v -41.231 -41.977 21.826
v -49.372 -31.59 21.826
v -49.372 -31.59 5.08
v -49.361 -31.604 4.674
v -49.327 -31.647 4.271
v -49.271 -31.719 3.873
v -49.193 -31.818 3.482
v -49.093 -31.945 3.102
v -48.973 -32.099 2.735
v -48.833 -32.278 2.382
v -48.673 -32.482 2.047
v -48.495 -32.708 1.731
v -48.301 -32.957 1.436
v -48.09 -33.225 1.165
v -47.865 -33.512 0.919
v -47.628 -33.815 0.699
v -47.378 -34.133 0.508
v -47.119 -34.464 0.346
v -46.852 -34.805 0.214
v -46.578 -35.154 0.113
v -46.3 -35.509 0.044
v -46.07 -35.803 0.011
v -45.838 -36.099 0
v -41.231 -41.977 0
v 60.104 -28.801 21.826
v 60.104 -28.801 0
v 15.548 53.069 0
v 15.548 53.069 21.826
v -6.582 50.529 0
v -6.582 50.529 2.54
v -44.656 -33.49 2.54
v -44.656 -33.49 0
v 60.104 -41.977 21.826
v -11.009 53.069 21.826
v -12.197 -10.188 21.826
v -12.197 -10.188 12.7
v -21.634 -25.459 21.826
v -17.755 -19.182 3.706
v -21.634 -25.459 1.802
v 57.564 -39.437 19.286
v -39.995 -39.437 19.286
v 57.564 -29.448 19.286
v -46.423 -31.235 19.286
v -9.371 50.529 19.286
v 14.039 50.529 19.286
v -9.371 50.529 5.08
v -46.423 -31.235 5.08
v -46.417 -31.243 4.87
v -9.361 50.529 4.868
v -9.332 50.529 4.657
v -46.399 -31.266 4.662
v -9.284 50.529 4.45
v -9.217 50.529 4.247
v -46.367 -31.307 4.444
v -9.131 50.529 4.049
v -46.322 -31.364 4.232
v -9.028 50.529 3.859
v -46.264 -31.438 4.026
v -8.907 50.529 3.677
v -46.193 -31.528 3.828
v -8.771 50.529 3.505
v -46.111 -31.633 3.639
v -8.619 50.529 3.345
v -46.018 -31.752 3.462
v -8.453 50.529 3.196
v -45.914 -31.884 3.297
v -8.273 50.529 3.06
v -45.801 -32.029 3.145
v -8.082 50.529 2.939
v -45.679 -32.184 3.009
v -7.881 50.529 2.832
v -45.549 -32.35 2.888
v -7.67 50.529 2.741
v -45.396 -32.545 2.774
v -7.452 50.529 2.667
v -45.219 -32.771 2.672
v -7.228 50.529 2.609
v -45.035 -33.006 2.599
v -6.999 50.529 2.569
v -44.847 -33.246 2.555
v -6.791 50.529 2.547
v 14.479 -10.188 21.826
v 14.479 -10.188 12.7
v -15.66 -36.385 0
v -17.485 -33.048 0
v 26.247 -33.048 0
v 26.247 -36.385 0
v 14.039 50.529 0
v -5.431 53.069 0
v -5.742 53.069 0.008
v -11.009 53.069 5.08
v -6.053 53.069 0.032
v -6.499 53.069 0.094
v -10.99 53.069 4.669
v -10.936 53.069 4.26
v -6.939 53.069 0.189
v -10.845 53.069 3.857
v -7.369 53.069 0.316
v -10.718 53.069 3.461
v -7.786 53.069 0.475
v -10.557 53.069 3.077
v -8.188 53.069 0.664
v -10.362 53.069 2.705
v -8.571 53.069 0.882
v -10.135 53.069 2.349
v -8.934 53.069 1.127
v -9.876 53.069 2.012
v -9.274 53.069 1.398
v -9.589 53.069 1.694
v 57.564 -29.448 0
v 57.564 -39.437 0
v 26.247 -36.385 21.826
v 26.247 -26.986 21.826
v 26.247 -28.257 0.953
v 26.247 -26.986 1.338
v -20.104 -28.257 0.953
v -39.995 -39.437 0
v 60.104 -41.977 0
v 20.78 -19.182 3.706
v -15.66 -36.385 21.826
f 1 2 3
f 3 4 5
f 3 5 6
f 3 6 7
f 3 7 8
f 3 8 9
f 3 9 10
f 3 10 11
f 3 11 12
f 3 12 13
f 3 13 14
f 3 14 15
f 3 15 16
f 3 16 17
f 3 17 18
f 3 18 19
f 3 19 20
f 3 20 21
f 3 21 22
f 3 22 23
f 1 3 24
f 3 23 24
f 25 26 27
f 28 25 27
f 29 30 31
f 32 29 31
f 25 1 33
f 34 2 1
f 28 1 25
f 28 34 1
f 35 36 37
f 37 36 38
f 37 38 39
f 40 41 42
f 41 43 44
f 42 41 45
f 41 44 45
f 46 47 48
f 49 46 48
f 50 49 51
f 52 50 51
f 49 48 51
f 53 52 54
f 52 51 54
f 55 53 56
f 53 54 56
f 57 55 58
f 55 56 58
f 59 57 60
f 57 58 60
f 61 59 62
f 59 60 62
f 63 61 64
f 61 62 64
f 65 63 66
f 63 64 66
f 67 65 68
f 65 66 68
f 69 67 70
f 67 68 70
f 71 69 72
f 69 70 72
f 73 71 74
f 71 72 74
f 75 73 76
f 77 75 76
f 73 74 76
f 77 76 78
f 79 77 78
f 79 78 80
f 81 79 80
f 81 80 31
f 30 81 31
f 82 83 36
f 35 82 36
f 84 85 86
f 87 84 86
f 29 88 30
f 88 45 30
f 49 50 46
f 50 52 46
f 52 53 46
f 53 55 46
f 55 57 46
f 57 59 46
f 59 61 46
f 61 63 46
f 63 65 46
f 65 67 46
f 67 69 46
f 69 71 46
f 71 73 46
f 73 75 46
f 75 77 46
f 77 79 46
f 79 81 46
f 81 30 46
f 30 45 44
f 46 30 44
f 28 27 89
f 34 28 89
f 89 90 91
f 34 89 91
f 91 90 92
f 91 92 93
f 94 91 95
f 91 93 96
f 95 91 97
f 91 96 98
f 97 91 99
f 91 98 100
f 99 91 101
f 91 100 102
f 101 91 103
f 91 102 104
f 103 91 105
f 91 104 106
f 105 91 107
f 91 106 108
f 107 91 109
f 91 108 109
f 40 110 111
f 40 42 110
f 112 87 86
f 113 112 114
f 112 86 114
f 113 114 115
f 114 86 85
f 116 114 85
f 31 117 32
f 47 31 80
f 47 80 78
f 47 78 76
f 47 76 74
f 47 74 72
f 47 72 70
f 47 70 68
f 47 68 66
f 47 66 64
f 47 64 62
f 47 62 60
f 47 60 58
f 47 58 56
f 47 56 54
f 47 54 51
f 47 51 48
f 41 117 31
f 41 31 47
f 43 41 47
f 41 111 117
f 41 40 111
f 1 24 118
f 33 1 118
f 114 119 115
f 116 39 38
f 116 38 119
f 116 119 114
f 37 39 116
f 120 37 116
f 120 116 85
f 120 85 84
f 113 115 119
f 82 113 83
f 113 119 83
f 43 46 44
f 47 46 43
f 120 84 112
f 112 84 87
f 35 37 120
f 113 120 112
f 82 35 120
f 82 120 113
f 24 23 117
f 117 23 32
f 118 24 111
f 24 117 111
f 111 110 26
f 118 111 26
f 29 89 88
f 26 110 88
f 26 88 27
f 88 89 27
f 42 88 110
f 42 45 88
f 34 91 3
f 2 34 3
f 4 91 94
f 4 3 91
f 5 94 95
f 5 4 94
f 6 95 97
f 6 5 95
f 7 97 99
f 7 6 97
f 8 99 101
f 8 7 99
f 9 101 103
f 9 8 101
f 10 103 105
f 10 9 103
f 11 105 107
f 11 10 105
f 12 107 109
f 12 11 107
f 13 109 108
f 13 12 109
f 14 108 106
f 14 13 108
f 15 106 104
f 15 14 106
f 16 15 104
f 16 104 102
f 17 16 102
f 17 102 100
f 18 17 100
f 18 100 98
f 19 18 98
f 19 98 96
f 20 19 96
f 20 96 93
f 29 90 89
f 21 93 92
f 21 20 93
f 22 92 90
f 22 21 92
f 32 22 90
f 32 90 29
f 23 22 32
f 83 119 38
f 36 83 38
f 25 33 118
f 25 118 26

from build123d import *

# Parameters (mm, degrees)
F2_DEPTH    = 21.8264274299
F3_R        = 5.08
F4_T        = -2.54
F5_SIZE     = 12.7
F6_SIZE     = 5.08
F7_SIZE     = 5.08
F8_T1_DEPTH = 70.3417608066


# Not quite as in the source:
# - a fillet or chamfer that OpenCascade refuses, or shapes differently, is made with other operations: its cross-section is extruded or revolved along the edge and cut away or added
# - a shell that OpenCascade refuses in one call is made with other operations: the cavity is built on its own and cut out


with BuildPart() as f2:
    # F1 (on Top) → F2 (new body)
    with BuildSketch(Plane.XY):
        Polygon((-21.634221077, -25.4589989781), (-15.6604591757, -36.3845676184), (26.2466259301, -36.3845676184), (26.2466259301, -26.9864313304), (14.4790392369, -10.1876780391), (-12.1967634186, -10.1876780391), align=None)
    extrude(amount=F2_DEPTH)

    # F5
    f5_edges = [f2.edges().sort_by_distance(p)[0] for p in [
        (1.141138, -10.187678, 0),
    ]]
    chamfer(f5_edges, length=F5_SIZE)

    # F6
    f6_edges = [f2.edges().sort_by_distance(p)[0] for p in [
        (1.665127, -22.887678, 0),
    ]]
    chamfer(f6_edges, length=F6_SIZE)

    # F7
    f7_edges = [f2.edges().sort_by_distance(p)[0] for p in [
        (2.992036, -27.967678, 0),
    ]]
    chamfer(f7_edges, length=F7_SIZE)

    # F8: chamfer of 5.08 on 1 edges, made by hand

    # F8_s2 → F8_t1 (cut)
    with BuildSketch(Plane.YZ.offset(-33.4897993752)):
        Polygon((-18.5810619888, 3.8880636728), (-28.2567592384, 0.9529730006), (-23.2743700139, 1.9440318364), align=None)
    extrude(amount=F8_T1_DEPTH, mode=Mode.SUBTRACT)


with BuildPart() as f2b:
    # F0 (on Top) → F2, piece 2 (new body)
    with BuildSketch(Plane.XY):
        Polygon((15.5484518036, 53.0691556633), (-11.0087171197, 53.0691556633), (-49.3722259998, -31.5896049142), (-41.2309654057, -41.9769249856), (60.1042881608, -41.9769249856), (60.1042881608, -28.8013797253), align=None)
    extrude(amount=F2_DEPTH)

    # F3
    f3_edges = [f2b.edges().sort_by_distance(p)[0] for p in [
        (-30.190472, 10.739775, 0),
    ]]
    fillet(f3_edges, radius=F3_R)

    # F4: a shell. OpenCascade refuses it in one call, so the cavity is built on its own and cut out:
    # the body offset inwards by the wall thickness, plus a prism from it out through each open face.
    f4_core = offset(f2b.part, amount=F4_T, kind=Kind.INTERSECTION, mode=Mode.PRIVATE)
    f4_exits = [f4_core.faces().sort_by_distance(p)[0] for p in [
        (6.185491, -4.45819, 2.54),
    ]]
    add(f4_core, mode=Mode.SUBTRACT)
    extrude(f4_exits, amount=-F4_T, mode=Mode.SUBTRACT)


solid = Compound([f2.part, f2b.part])
